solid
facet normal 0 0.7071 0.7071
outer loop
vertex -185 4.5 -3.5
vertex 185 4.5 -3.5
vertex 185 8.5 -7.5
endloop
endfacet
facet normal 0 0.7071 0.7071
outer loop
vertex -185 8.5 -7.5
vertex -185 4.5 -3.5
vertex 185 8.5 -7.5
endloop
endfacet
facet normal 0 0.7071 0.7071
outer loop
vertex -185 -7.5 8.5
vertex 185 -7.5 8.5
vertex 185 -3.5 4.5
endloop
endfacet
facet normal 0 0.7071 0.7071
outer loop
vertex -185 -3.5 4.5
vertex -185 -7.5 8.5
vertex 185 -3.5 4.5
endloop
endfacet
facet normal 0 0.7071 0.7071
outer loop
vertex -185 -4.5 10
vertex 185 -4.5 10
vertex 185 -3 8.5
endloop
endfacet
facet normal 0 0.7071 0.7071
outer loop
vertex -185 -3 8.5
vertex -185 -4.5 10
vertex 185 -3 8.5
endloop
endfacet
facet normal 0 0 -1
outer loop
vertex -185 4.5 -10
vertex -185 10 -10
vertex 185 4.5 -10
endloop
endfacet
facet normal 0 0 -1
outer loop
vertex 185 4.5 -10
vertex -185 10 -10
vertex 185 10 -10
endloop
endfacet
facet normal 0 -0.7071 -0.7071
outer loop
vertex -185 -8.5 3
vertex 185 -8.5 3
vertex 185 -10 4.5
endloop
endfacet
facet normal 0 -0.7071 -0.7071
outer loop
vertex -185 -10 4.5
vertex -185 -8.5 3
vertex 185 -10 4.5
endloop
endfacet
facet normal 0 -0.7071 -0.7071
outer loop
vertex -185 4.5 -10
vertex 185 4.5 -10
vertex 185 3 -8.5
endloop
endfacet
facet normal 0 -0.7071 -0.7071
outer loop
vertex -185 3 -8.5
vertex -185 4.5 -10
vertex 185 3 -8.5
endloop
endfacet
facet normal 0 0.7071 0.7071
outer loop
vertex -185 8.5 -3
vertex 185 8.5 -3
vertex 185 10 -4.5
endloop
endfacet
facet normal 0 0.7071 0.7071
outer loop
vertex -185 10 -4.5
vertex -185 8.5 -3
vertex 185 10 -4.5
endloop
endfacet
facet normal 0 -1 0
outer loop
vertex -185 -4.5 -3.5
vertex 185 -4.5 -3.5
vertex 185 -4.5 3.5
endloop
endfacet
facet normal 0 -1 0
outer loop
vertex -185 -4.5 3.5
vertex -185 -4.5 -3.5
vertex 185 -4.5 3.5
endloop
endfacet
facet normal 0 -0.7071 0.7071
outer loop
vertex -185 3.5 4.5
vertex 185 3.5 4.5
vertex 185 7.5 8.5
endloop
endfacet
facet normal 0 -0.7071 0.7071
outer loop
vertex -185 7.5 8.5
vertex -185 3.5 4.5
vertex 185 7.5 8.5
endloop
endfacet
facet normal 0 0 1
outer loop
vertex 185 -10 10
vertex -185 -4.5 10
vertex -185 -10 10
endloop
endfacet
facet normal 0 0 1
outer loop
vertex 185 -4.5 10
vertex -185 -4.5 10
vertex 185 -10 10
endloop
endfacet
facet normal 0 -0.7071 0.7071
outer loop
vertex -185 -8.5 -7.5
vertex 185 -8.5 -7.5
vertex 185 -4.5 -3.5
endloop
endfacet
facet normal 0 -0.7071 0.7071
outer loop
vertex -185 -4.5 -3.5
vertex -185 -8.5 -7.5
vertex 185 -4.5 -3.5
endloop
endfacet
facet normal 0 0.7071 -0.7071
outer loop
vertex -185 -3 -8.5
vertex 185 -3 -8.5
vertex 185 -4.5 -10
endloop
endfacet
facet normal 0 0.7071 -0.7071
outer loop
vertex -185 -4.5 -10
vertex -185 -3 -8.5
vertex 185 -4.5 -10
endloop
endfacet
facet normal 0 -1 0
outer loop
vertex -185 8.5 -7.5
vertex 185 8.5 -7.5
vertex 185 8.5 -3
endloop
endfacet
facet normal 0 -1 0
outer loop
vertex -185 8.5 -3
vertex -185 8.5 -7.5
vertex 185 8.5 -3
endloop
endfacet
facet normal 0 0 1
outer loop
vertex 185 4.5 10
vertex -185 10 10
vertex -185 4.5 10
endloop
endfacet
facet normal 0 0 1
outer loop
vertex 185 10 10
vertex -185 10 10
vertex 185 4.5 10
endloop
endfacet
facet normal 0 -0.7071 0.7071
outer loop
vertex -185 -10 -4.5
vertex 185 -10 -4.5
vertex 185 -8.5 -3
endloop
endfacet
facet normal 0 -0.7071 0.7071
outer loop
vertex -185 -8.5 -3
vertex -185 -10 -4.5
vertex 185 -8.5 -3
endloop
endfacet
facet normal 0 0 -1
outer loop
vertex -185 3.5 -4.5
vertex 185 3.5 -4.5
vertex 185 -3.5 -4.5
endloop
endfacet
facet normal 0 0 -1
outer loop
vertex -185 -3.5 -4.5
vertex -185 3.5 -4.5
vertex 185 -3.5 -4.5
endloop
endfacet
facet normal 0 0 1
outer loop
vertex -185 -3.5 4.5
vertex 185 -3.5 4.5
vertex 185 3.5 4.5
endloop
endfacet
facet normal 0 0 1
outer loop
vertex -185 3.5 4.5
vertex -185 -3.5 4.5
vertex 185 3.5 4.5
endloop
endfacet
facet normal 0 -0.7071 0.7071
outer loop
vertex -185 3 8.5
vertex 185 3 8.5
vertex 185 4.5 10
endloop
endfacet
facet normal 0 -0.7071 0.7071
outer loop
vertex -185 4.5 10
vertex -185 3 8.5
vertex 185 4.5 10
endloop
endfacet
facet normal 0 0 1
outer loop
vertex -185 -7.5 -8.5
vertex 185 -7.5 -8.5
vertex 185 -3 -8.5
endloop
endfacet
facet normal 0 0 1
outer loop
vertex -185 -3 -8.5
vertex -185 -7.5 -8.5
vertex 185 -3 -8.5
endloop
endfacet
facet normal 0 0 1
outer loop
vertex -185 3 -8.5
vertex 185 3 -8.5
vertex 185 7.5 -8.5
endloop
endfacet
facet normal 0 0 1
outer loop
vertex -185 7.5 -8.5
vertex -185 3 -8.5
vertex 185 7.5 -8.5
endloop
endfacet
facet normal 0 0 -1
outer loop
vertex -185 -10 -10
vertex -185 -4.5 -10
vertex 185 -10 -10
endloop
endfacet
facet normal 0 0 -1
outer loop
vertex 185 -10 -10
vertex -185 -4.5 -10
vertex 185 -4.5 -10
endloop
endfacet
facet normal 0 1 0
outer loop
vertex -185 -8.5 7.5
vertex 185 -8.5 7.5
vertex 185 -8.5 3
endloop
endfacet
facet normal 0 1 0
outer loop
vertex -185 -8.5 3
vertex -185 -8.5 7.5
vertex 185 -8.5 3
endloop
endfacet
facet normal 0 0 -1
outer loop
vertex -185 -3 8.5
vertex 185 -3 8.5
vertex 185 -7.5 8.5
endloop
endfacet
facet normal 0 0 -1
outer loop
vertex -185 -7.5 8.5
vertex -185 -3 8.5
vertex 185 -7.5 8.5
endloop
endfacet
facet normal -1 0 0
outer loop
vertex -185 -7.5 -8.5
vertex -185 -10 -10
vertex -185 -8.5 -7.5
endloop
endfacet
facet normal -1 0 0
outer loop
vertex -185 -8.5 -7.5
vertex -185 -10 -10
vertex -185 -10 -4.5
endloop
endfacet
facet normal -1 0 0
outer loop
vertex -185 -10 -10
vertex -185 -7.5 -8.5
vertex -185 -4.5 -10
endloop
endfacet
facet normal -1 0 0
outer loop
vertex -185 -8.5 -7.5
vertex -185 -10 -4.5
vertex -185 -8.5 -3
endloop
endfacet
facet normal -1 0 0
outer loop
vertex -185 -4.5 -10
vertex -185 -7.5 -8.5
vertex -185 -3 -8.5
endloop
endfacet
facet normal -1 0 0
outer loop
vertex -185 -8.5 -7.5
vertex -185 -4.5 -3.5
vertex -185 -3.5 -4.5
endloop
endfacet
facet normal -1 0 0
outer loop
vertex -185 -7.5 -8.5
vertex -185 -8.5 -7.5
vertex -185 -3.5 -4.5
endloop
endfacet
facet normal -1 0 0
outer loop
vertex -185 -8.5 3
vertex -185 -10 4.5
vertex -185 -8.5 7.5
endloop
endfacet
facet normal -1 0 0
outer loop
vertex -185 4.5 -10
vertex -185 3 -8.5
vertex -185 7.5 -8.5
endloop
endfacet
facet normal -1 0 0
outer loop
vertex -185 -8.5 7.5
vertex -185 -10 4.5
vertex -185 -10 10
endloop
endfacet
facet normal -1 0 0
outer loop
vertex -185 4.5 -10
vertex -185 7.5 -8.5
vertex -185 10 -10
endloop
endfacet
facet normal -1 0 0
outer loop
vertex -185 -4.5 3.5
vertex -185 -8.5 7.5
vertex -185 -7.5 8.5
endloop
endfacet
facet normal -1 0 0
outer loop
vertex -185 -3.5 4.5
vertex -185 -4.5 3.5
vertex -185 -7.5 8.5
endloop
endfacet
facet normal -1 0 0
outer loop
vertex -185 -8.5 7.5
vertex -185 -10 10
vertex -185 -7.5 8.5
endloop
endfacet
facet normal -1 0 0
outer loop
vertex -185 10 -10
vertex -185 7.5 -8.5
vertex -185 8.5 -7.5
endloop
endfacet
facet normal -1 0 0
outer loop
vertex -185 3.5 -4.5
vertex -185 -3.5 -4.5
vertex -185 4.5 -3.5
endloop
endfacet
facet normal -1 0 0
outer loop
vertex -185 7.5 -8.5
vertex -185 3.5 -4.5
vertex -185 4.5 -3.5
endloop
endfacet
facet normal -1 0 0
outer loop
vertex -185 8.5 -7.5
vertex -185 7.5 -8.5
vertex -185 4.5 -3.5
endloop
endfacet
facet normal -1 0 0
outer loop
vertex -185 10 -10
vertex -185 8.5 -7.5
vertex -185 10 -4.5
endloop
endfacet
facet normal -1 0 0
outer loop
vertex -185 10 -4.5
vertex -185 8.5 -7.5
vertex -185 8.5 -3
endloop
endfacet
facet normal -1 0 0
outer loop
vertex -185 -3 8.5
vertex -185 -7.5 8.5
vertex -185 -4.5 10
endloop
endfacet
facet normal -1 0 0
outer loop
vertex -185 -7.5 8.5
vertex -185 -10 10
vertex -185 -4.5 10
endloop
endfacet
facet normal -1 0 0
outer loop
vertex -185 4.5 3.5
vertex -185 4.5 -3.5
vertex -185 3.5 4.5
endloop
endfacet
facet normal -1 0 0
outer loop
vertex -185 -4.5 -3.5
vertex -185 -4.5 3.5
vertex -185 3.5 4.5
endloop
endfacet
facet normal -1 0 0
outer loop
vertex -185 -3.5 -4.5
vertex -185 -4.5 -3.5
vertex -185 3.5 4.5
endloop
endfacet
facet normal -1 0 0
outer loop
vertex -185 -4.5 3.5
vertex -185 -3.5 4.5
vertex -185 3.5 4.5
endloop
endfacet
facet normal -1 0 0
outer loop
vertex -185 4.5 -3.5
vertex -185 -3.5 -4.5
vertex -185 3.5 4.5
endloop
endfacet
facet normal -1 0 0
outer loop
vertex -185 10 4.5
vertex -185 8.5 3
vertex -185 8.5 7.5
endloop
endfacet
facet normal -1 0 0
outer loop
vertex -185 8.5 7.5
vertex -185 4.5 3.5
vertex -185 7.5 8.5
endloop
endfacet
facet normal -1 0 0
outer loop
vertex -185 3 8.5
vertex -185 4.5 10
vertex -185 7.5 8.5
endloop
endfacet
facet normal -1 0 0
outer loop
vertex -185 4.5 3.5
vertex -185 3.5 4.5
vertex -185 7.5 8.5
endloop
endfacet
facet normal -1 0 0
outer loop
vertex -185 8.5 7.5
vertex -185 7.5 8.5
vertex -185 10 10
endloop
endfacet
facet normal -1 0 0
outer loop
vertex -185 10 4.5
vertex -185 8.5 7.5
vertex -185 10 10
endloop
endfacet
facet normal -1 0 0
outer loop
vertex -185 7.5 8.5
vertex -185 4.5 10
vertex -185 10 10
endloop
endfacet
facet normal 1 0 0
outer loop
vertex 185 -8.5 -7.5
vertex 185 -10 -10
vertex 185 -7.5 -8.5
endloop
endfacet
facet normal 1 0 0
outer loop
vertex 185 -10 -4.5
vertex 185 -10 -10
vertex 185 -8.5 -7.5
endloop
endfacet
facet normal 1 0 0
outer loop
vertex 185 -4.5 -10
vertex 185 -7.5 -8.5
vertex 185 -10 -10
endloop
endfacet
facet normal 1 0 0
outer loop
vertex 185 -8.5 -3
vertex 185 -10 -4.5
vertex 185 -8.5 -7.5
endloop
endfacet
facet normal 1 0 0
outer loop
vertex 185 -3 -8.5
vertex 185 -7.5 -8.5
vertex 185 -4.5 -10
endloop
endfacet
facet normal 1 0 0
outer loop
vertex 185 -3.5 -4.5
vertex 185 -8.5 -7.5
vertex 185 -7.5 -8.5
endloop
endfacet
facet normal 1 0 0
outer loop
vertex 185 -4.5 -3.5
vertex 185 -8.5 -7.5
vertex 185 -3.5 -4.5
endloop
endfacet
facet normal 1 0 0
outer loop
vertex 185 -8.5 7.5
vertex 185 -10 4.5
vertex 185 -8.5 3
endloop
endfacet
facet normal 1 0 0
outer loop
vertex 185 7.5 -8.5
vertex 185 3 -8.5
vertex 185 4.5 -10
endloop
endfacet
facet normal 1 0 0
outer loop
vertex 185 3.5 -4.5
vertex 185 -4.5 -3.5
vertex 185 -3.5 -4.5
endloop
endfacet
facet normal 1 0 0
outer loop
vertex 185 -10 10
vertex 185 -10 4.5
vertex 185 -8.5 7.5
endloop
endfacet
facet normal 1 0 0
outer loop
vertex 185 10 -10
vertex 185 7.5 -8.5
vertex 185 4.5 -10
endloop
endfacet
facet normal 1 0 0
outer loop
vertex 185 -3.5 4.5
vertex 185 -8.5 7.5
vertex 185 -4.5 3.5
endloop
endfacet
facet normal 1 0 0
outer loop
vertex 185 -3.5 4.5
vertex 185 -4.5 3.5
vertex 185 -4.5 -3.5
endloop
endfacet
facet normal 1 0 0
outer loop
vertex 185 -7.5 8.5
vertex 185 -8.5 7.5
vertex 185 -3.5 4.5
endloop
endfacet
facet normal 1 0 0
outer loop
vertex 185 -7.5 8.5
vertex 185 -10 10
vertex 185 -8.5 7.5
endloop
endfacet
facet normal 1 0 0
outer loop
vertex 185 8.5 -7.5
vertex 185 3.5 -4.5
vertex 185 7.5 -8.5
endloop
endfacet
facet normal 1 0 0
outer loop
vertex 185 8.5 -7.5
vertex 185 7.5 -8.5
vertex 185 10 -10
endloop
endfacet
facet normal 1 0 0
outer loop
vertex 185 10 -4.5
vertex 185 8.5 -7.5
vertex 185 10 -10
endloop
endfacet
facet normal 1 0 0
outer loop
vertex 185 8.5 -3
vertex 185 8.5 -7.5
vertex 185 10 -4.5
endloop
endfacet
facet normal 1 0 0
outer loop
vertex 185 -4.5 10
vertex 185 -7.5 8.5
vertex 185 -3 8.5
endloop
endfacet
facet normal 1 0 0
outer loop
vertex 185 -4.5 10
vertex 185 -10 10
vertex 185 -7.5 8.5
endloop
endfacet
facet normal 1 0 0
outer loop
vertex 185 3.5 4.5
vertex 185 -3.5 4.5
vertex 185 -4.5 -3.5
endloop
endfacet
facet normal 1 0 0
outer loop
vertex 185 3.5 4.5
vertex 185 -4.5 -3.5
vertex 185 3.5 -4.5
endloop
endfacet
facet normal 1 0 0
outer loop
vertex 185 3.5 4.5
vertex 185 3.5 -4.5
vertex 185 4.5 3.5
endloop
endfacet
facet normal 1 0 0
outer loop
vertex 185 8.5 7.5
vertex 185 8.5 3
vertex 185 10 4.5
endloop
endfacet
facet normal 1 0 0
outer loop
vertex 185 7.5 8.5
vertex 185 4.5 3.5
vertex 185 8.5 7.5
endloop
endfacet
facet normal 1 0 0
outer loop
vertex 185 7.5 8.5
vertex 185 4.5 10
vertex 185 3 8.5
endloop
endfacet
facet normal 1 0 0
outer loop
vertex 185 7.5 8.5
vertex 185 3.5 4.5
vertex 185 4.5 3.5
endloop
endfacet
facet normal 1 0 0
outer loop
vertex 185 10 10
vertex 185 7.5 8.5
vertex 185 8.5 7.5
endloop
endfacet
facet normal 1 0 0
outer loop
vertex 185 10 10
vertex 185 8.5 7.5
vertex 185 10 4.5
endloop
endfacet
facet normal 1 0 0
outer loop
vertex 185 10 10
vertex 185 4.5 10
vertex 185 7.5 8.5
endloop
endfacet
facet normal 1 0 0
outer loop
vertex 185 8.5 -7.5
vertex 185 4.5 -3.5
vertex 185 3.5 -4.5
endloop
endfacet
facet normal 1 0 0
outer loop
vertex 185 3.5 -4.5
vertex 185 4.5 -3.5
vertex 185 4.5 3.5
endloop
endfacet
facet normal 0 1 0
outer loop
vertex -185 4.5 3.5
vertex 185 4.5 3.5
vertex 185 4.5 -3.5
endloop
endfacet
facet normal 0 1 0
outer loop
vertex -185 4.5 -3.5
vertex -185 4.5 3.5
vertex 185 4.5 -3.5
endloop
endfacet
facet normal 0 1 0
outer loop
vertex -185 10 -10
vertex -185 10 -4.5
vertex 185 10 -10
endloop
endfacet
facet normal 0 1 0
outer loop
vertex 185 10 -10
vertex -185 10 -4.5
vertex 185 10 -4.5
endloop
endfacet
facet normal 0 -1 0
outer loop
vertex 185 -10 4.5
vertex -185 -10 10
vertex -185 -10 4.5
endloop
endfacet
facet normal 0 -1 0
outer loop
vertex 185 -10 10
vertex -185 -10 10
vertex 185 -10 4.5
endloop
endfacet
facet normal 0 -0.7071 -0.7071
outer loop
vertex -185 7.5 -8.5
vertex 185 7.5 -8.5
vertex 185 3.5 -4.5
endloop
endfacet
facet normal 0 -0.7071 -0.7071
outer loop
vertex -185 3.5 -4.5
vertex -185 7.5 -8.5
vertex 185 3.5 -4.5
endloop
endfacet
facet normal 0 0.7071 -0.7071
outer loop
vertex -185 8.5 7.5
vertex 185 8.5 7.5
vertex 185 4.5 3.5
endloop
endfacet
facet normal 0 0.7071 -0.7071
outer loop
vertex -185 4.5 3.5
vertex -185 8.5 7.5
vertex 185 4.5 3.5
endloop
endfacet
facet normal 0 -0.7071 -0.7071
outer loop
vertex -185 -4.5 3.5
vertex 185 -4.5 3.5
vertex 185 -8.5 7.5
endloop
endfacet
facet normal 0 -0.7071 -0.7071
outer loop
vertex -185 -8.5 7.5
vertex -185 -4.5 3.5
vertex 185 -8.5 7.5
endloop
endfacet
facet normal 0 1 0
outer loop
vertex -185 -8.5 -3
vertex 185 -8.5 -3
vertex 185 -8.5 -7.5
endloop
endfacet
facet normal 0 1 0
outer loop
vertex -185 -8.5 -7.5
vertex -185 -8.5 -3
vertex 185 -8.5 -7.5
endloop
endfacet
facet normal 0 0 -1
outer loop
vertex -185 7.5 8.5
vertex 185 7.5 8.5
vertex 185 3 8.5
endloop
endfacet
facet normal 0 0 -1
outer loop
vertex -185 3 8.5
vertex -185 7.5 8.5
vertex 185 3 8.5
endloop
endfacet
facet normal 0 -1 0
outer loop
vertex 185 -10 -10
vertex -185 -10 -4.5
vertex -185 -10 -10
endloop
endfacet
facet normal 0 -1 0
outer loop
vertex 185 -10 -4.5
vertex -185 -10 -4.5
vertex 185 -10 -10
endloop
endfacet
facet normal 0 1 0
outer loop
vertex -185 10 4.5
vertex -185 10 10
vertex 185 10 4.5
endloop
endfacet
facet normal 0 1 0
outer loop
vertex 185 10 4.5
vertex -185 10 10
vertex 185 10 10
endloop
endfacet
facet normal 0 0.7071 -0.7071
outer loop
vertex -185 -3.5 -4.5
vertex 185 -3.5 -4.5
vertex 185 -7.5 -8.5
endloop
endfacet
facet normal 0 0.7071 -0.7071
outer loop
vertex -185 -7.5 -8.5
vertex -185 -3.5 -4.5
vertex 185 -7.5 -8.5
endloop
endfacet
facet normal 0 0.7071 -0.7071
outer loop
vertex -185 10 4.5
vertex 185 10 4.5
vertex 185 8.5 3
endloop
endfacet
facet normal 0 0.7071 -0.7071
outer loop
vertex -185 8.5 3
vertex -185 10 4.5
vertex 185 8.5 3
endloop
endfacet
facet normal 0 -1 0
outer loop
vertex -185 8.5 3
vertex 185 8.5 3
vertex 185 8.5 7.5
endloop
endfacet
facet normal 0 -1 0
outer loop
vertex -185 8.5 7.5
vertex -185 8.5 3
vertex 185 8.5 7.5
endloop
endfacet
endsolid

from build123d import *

# Parameters (mm, degrees)
F0_W     = 370
F0_H     = 20
F1_DEPTH = 10
F3_DEPTH = 370.001


with BuildPart() as f1:
    # F0 (on Top) → F1 (new body, symmetric)
    with BuildSketch(Plane.XY):
        Rectangle(F0_W, F0_H)
    extrude(amount=F1_DEPTH, both=True)

    # F2 (on face) → F3 (cut, through all)
    with BuildSketch(Plane.YZ.offset(185)):
        Polygon((-8.5, 3), (-10, 4.5), (-10, -4.5), (-8.5, -3), (-8.5, -7.5), (-4.5, -3.5), (-4.5, 0), (-4.5, 3.5), (-8.5, 7.5), align=None)
        Polygon((-3, -8.5), (-4.5, -10), (4.5, -10), (3, -8.5), (7.5, -8.5), (3.5, -4.5), (0, -4.5), (-3.5, -4.5), (-7.5, -8.5), align=None)
        Polygon((10, -4.5), (10, 4.5), (8.5, 3), (8.5, 7.5), (4.5, 3.5), (4.5, 0), (4.5, -3.5), (8.5, -7.5), (8.5, -3), align=None)
        Polygon((4.5, 10), (-4.5, 10), (-3, 8.5), (-7.5, 8.5), (-3.5, 4.5), (0, 4.5), (3.5, 4.5), (7.5, 8.5), (3, 8.5), align=None)
    extrude(amount=-F3_DEPTH, mode=Mode.SUBTRACT)


solid = f1.part
